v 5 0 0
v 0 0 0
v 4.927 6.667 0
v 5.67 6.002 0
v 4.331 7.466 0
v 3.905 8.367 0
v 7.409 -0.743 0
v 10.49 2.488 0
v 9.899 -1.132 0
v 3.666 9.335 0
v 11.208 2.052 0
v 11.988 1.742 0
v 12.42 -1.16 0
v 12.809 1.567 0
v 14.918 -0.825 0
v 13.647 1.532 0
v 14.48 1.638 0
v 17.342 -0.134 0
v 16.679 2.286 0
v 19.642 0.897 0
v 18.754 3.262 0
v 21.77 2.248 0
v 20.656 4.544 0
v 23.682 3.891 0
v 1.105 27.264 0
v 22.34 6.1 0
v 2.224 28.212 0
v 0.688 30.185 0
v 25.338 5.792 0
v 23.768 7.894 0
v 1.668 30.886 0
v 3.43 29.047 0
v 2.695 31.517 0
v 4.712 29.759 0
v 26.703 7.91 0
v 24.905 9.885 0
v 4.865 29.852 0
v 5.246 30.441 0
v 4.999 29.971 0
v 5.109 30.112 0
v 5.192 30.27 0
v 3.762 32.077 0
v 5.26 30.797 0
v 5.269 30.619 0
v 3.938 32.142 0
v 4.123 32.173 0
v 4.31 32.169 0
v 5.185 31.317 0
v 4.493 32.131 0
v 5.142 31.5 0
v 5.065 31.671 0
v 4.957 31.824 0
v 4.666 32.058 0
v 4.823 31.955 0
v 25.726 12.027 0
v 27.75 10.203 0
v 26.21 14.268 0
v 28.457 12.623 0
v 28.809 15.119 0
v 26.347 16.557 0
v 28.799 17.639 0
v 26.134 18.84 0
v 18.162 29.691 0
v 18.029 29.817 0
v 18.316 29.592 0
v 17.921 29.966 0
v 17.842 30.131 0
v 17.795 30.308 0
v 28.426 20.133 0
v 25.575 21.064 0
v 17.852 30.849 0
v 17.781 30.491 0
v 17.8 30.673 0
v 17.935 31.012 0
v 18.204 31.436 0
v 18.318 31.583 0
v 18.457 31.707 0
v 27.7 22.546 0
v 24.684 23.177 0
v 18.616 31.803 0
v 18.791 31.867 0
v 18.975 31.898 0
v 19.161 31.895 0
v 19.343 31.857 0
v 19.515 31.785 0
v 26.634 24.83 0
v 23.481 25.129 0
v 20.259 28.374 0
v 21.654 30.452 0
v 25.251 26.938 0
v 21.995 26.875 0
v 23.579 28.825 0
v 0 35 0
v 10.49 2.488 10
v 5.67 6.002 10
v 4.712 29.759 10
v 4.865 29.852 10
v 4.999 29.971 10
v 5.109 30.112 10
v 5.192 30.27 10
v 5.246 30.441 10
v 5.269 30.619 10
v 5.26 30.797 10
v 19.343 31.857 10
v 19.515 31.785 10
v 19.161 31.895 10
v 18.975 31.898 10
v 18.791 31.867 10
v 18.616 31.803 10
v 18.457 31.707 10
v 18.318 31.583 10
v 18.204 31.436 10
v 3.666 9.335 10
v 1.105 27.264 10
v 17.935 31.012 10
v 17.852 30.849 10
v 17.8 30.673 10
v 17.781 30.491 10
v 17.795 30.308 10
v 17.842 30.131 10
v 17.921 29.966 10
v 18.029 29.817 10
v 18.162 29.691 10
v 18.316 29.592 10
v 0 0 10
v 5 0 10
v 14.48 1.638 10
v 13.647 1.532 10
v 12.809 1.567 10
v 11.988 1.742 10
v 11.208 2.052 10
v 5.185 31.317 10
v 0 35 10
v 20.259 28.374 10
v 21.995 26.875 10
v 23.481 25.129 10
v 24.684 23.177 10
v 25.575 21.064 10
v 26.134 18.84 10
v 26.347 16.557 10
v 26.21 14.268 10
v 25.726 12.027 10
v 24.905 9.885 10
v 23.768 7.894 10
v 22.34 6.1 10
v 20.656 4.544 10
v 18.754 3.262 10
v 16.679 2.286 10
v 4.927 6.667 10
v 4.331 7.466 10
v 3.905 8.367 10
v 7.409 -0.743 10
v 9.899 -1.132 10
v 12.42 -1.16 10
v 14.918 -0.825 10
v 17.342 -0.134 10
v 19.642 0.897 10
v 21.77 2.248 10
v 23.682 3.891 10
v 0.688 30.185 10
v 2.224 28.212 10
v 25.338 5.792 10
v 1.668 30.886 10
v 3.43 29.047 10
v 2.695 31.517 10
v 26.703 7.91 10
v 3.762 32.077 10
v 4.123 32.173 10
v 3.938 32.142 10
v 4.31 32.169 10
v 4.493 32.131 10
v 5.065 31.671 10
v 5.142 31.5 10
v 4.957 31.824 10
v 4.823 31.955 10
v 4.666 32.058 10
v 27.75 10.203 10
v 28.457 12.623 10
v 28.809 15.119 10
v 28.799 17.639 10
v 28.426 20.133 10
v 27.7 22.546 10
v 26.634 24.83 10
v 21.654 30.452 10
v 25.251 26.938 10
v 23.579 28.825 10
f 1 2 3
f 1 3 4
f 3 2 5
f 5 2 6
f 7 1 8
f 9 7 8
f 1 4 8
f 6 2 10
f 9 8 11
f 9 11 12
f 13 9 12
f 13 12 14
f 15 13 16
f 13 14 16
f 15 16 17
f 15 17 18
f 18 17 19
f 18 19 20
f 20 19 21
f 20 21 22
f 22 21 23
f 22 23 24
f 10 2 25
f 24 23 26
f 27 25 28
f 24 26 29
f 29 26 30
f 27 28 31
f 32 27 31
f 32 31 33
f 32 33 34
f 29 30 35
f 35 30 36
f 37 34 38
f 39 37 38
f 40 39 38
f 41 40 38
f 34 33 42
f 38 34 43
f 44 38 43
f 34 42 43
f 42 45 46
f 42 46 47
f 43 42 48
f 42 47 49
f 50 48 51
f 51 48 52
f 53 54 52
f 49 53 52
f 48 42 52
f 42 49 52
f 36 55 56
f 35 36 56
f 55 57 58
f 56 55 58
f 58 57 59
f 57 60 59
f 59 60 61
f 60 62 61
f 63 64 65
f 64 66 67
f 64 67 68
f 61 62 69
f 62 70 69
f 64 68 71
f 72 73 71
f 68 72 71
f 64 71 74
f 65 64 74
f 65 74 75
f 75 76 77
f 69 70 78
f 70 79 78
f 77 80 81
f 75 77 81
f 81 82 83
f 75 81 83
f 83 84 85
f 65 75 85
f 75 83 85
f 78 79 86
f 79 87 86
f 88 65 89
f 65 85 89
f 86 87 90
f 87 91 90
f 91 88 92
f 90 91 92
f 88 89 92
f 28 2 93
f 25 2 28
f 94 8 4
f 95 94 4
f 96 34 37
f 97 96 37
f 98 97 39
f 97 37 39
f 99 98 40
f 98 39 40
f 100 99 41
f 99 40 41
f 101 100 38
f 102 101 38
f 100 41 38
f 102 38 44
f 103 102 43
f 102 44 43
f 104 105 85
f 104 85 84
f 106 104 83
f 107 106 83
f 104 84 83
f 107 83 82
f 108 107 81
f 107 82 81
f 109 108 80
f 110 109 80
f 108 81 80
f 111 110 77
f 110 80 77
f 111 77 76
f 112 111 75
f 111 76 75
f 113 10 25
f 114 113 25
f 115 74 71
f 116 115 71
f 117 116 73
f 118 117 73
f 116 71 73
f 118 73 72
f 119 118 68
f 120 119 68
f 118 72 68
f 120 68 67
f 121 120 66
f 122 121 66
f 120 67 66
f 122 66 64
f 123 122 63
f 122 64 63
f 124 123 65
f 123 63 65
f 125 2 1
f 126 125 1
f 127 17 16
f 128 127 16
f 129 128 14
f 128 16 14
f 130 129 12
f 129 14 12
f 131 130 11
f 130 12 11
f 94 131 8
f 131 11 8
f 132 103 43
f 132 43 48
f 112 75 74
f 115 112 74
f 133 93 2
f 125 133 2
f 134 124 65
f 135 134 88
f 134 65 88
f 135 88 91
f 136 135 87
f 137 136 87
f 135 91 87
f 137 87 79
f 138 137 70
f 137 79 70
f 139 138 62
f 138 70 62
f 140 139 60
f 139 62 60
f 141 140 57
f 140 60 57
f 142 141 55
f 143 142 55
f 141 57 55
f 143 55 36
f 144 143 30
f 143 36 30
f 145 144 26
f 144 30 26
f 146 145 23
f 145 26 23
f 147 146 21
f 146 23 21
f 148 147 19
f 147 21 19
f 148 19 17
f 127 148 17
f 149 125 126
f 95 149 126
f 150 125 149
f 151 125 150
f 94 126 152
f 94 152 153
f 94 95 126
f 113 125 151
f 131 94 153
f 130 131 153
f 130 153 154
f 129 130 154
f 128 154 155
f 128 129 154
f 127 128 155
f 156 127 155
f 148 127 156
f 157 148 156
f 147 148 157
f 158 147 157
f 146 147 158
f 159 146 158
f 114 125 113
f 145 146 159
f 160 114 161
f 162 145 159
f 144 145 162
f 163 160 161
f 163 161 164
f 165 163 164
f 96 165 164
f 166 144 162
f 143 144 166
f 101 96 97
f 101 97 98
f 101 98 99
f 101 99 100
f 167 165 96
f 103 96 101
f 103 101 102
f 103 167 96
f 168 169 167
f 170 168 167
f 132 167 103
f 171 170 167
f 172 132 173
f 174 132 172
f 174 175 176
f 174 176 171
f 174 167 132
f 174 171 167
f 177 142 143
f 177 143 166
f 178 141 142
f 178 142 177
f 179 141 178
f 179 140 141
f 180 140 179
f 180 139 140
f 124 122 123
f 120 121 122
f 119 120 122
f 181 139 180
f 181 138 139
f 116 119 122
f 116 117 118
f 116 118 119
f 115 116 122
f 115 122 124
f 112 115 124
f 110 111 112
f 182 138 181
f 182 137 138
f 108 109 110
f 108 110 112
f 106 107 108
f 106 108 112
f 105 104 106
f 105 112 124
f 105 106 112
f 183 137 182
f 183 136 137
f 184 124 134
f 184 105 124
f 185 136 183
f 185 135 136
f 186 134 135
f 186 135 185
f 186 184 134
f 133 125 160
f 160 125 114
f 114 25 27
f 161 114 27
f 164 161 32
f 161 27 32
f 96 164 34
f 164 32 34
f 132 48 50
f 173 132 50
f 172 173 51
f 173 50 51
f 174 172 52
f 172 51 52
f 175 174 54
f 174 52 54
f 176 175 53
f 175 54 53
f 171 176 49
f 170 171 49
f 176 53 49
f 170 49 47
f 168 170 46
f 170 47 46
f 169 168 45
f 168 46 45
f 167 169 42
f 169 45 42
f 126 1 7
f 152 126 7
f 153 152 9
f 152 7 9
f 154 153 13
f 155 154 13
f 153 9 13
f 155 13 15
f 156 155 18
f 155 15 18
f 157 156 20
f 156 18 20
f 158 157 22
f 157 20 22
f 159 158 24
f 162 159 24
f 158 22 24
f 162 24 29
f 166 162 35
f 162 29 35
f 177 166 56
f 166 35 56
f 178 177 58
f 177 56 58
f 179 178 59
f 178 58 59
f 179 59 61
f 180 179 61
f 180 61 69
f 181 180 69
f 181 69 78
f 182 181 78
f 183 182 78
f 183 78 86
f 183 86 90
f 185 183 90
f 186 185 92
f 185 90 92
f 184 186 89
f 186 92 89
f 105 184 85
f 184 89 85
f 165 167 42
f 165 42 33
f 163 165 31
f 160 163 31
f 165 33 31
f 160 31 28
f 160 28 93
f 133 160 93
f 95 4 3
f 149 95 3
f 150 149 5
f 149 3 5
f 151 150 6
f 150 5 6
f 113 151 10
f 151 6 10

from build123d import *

# Parameters (mm, degrees)
F1_DEPTH = 10


with BuildPart() as f1:
    # F0 (on Top) → F1 (new body)
    with BuildSketch(Plane.XY):
        with BuildLine():
            Line((0, 35), (0, 0))
            Line((0, 0), (5, 0))
            ThreePointArc((5, 0), (27.268138, 9.037983), (19.515337, 31.785493))
            ThreePointArc((19.515337, 31.785493), (18.791109, 31.867286), (18.203721, 31.43581))
            Line((18.203721, 31.43581), (17.935476, 31.011956))
            ThreePointArc((17.935476, 31.011956), (17.81454, 30.218384), (18.316033, 29.591577))
            ThreePointArc((18.316033, 29.591577), (26.210162, 14.267979), (14.479586, 1.637717))
            ThreePointArc((14.479586, 1.637717), (12.394446, 1.637374), (10.490482, 2.487509))
            Line((10.490482, 2.487509), (5.670462, 6.001867))
            ThreePointArc((5.670462, 6.001867), (4.331112, 7.465551), (3.666444, 9.334894))
            Line((3.666444, 9.334894), (1.105092, 27.264357))
            ThreePointArc((1.105092, 27.264357), (2.816973, 28.644292), (4.712199, 29.759137))
            ThreePointArc((4.712199, 29.759137), (5.154266, 30.18947), (5.259664, 30.797335))
            Line((5.259664, 30.797335), (5.185379, 31.317331))
            ThreePointArc((5.185379, 31.317331), (4.66625, 32.058139), (3.761852, 32.077026))
            ThreePointArc((3.761852, 32.077026), (2.175949, 31.2104), (0.687881, 30.184836))
            Line((0.687881, 30.184836), (0, 35))
        make_face()
    extrude(amount=F1_DEPTH)


solid = f1.part
